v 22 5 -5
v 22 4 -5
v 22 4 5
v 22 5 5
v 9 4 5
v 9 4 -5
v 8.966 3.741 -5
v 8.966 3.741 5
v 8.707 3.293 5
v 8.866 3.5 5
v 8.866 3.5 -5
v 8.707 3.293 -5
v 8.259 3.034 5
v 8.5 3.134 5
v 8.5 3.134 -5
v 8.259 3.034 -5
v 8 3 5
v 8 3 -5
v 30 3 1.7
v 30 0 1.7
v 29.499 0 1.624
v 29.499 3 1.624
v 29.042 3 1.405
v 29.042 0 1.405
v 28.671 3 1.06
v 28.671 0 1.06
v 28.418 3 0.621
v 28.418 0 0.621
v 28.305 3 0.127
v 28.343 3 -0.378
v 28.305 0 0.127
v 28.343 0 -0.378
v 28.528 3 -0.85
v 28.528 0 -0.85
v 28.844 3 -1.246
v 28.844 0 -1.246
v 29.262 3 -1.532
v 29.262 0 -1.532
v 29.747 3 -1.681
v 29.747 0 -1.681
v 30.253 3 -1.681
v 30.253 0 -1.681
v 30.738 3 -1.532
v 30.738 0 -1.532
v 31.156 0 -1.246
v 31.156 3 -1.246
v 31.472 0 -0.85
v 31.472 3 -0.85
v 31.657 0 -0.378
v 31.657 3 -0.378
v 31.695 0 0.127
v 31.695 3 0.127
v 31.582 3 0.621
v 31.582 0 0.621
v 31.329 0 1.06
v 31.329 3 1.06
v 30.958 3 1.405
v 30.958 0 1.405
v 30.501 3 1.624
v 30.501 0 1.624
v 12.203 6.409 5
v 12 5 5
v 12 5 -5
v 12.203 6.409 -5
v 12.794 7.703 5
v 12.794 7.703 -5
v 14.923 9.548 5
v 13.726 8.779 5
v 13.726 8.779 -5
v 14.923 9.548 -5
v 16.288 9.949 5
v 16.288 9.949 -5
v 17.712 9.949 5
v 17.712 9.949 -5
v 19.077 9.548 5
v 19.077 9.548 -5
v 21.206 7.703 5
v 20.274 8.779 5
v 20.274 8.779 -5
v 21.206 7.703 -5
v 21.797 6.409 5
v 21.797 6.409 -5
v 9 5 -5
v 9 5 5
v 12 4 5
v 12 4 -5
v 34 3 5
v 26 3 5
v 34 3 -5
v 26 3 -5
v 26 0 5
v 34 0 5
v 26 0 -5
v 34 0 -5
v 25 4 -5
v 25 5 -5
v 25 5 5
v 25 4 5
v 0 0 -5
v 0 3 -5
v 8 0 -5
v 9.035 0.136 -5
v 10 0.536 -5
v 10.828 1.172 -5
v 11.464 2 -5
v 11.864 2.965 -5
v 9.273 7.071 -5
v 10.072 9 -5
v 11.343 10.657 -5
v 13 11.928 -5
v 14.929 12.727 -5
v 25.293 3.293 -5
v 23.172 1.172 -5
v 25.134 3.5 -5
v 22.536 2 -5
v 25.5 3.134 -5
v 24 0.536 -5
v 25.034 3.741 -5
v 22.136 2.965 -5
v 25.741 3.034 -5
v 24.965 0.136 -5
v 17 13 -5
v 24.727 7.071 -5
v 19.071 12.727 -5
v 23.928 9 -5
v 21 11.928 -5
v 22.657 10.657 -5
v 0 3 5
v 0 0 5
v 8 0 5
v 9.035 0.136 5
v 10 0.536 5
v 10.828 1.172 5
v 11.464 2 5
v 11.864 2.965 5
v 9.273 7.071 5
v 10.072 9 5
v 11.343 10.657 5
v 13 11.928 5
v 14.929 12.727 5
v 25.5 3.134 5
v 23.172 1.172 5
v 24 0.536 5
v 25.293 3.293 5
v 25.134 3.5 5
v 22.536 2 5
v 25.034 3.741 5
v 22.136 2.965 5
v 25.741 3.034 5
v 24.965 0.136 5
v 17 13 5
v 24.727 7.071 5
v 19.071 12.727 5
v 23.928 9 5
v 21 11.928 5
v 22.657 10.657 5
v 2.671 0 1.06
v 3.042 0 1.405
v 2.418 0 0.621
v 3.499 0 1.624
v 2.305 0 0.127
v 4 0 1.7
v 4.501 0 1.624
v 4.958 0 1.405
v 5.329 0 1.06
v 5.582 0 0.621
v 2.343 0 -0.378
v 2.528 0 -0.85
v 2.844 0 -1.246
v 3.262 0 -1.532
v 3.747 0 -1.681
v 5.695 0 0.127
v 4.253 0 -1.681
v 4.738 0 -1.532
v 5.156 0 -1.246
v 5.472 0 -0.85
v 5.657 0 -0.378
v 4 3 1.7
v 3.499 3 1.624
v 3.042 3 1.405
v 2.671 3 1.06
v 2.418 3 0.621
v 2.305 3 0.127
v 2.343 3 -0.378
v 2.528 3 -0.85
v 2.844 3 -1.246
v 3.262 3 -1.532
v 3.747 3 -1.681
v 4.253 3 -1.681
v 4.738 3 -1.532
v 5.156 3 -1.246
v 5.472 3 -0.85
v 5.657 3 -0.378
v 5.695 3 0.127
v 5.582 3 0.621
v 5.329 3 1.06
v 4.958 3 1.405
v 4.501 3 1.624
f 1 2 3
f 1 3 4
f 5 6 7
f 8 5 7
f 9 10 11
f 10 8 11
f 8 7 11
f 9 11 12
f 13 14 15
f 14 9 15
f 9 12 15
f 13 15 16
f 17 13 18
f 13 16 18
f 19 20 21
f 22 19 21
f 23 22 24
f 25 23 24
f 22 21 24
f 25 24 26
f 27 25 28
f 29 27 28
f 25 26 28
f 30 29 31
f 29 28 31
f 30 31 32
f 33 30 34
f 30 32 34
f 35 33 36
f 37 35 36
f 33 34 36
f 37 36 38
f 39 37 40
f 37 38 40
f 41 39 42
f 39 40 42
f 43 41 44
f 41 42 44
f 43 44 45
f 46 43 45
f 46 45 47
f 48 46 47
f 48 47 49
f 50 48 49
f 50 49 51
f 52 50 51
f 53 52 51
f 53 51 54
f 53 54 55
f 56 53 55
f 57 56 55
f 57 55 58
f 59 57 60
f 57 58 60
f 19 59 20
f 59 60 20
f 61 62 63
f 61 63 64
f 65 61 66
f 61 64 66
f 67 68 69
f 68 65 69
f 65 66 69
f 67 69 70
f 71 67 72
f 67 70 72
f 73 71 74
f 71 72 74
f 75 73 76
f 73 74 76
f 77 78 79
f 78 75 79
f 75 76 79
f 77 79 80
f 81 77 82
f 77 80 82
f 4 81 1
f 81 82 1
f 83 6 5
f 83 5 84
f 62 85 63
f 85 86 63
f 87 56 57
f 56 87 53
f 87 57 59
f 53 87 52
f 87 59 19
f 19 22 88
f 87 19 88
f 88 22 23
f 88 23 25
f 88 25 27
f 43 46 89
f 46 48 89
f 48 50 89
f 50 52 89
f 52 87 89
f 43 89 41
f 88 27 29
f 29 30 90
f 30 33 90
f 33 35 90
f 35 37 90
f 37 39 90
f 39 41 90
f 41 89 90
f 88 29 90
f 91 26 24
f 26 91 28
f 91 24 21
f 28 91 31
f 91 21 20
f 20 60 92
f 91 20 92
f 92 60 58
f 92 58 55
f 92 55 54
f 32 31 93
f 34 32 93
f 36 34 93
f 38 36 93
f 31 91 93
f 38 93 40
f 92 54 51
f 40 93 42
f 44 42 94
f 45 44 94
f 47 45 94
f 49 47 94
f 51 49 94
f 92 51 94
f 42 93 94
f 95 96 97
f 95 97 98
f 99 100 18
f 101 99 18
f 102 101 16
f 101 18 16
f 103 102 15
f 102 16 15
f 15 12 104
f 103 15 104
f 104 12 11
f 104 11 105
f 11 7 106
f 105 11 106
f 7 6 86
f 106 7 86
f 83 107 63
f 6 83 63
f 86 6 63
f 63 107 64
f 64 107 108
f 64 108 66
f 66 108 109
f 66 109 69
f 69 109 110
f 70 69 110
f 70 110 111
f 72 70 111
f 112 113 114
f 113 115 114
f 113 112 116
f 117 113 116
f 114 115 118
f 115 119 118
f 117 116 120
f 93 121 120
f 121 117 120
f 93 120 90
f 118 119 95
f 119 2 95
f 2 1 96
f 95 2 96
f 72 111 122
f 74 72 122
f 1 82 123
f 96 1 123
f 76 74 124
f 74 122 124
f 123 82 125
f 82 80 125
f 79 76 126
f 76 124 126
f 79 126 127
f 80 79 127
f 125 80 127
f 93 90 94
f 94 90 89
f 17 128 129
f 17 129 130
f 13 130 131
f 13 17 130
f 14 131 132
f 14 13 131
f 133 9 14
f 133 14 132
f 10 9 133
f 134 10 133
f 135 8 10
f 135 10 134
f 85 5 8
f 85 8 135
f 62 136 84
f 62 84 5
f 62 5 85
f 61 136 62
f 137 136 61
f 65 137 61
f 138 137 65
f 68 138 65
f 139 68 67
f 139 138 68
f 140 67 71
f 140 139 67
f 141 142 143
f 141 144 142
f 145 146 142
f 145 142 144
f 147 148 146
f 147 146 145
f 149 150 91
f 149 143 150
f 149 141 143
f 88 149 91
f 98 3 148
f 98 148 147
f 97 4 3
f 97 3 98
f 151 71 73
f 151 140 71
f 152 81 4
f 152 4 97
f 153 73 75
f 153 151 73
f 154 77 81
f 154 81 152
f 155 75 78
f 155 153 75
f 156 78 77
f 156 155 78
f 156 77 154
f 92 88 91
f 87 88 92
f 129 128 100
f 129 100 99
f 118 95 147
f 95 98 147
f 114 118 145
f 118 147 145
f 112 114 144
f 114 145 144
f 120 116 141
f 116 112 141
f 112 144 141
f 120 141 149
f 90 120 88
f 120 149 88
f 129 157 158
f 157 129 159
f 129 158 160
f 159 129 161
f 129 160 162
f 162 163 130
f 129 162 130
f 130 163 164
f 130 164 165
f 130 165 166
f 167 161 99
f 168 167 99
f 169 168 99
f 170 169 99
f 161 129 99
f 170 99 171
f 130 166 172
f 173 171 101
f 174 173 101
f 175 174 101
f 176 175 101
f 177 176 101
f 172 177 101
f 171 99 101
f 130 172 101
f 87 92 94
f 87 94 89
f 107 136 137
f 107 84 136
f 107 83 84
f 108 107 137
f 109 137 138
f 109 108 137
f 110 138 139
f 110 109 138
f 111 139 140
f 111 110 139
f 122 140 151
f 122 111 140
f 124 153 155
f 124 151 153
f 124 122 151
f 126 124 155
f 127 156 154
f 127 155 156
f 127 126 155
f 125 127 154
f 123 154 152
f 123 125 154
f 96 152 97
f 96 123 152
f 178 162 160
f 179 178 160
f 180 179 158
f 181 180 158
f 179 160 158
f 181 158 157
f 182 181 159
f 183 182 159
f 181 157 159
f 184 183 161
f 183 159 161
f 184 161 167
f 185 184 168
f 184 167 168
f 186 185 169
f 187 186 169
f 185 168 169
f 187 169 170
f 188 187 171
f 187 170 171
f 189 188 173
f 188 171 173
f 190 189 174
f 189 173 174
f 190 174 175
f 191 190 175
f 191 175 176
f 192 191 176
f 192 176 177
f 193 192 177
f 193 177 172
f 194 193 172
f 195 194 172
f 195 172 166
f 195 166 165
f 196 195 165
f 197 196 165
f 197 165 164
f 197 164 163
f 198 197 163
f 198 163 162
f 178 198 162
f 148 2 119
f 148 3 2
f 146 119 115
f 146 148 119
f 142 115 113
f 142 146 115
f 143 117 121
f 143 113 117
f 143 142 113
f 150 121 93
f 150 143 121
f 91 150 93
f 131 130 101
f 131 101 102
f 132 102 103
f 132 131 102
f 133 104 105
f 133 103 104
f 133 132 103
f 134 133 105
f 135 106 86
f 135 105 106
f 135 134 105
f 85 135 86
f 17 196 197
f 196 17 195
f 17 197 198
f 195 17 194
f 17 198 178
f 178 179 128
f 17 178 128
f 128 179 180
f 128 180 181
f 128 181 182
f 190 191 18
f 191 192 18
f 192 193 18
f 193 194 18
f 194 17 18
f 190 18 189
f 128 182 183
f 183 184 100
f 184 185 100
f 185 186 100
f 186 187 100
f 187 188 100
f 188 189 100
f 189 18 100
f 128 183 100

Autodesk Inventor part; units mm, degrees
ref_plane "YZ Plane" through (0, 0, 0) normal (1, 0, 0) x (0, 1, 0)
ref_plane "XZ Plane" through (0, 0, 0) normal (0, 1, 0) x (-1, 0, 0)
ref_plane "XY Plane" through (0, 0, 0) normal (0, 0, 1) x (1, 0, 0)
sketch "Sketch1" plane through (0, 0, 0) normal (0, 0, 1) x (1, 0, 0)
  line L0 (0, 0) -> (12, 0)
  line L1 (12, 0) -> (12, 3)
  line L2 (12, 3) -> (0, 3)
  line L3 (0, 3) -> (0, 0)
  line L4 (12, 0) -> (9, 0)
  line L5 (9, 0) -> (9, 5)
  line L6 (9, 5) -> (12, 5)
  line L7 (12, 5) -> (12, 0)
  line L8 (22, 5) -> (25, 5)
  line L9 (25, 5) -> (25, 0)
  line L10 (25, 0) -> (22, 0)
  line L11 (22, 0) -> (22, 5)
  line L12 (22, 0) -> (34, 0)
  line L13 (34, 0) -> (34, 3)
  line L14 (34, 3) -> (22, 3)
  line L15 (22, 3) -> (22, 0)
  arc A0 (25, 5) -> (9, 5) centre (17, 5) ccw
  arc A1 (22, 5) -> (12, 5) centre (17, 5) ccw
  dimension "d0" = 3
  dimension "d1" = 3
  dimension "d2" = 12
  dimension "d3" = 12
  dimension "d4" = 5
  dimension "d5" = 5
extrude "Extrusion1" add sketch "Sketch1" along normal mid plane 10
fillet "Fillet1" radius 1 2 edges at (25, 3, 0) (9, 3, 0)
fillet "Fillet2" radius 4 2 edges at (22, 0, 0) (12, 0, 0)
sketch "Sketch2" plane through (0, 3, 5) normal (0, 1, 0) x (1, 0, 0)
  line L0 (0, 10) -> (0, 0) projected
  line L1 (0, 10) -> (8, 10) projected
  line L2 (26, 10) -> (34, 10) projected
  point P0 (0, 5)
  point P1 (4, 5)
  point P2 (30, 5)
  point P3 (0, 5)
  point P4 (4, 10)
  point P5 (30, 10)
  dimension "d10" = 26
hole "Hole1" at (4, 3, 0) at (30, 3, 0) direction (0, -1, 0) diameter 3.4 end through all clearance for "Flat Head Machine Screw" size "M3" standard "Ansi Metric M Profile"
equation "\"d1\" = d0"
equation "\"d3\" = d2"
properties part number "Top_Cable Tie" material "Aluminum 6061"
